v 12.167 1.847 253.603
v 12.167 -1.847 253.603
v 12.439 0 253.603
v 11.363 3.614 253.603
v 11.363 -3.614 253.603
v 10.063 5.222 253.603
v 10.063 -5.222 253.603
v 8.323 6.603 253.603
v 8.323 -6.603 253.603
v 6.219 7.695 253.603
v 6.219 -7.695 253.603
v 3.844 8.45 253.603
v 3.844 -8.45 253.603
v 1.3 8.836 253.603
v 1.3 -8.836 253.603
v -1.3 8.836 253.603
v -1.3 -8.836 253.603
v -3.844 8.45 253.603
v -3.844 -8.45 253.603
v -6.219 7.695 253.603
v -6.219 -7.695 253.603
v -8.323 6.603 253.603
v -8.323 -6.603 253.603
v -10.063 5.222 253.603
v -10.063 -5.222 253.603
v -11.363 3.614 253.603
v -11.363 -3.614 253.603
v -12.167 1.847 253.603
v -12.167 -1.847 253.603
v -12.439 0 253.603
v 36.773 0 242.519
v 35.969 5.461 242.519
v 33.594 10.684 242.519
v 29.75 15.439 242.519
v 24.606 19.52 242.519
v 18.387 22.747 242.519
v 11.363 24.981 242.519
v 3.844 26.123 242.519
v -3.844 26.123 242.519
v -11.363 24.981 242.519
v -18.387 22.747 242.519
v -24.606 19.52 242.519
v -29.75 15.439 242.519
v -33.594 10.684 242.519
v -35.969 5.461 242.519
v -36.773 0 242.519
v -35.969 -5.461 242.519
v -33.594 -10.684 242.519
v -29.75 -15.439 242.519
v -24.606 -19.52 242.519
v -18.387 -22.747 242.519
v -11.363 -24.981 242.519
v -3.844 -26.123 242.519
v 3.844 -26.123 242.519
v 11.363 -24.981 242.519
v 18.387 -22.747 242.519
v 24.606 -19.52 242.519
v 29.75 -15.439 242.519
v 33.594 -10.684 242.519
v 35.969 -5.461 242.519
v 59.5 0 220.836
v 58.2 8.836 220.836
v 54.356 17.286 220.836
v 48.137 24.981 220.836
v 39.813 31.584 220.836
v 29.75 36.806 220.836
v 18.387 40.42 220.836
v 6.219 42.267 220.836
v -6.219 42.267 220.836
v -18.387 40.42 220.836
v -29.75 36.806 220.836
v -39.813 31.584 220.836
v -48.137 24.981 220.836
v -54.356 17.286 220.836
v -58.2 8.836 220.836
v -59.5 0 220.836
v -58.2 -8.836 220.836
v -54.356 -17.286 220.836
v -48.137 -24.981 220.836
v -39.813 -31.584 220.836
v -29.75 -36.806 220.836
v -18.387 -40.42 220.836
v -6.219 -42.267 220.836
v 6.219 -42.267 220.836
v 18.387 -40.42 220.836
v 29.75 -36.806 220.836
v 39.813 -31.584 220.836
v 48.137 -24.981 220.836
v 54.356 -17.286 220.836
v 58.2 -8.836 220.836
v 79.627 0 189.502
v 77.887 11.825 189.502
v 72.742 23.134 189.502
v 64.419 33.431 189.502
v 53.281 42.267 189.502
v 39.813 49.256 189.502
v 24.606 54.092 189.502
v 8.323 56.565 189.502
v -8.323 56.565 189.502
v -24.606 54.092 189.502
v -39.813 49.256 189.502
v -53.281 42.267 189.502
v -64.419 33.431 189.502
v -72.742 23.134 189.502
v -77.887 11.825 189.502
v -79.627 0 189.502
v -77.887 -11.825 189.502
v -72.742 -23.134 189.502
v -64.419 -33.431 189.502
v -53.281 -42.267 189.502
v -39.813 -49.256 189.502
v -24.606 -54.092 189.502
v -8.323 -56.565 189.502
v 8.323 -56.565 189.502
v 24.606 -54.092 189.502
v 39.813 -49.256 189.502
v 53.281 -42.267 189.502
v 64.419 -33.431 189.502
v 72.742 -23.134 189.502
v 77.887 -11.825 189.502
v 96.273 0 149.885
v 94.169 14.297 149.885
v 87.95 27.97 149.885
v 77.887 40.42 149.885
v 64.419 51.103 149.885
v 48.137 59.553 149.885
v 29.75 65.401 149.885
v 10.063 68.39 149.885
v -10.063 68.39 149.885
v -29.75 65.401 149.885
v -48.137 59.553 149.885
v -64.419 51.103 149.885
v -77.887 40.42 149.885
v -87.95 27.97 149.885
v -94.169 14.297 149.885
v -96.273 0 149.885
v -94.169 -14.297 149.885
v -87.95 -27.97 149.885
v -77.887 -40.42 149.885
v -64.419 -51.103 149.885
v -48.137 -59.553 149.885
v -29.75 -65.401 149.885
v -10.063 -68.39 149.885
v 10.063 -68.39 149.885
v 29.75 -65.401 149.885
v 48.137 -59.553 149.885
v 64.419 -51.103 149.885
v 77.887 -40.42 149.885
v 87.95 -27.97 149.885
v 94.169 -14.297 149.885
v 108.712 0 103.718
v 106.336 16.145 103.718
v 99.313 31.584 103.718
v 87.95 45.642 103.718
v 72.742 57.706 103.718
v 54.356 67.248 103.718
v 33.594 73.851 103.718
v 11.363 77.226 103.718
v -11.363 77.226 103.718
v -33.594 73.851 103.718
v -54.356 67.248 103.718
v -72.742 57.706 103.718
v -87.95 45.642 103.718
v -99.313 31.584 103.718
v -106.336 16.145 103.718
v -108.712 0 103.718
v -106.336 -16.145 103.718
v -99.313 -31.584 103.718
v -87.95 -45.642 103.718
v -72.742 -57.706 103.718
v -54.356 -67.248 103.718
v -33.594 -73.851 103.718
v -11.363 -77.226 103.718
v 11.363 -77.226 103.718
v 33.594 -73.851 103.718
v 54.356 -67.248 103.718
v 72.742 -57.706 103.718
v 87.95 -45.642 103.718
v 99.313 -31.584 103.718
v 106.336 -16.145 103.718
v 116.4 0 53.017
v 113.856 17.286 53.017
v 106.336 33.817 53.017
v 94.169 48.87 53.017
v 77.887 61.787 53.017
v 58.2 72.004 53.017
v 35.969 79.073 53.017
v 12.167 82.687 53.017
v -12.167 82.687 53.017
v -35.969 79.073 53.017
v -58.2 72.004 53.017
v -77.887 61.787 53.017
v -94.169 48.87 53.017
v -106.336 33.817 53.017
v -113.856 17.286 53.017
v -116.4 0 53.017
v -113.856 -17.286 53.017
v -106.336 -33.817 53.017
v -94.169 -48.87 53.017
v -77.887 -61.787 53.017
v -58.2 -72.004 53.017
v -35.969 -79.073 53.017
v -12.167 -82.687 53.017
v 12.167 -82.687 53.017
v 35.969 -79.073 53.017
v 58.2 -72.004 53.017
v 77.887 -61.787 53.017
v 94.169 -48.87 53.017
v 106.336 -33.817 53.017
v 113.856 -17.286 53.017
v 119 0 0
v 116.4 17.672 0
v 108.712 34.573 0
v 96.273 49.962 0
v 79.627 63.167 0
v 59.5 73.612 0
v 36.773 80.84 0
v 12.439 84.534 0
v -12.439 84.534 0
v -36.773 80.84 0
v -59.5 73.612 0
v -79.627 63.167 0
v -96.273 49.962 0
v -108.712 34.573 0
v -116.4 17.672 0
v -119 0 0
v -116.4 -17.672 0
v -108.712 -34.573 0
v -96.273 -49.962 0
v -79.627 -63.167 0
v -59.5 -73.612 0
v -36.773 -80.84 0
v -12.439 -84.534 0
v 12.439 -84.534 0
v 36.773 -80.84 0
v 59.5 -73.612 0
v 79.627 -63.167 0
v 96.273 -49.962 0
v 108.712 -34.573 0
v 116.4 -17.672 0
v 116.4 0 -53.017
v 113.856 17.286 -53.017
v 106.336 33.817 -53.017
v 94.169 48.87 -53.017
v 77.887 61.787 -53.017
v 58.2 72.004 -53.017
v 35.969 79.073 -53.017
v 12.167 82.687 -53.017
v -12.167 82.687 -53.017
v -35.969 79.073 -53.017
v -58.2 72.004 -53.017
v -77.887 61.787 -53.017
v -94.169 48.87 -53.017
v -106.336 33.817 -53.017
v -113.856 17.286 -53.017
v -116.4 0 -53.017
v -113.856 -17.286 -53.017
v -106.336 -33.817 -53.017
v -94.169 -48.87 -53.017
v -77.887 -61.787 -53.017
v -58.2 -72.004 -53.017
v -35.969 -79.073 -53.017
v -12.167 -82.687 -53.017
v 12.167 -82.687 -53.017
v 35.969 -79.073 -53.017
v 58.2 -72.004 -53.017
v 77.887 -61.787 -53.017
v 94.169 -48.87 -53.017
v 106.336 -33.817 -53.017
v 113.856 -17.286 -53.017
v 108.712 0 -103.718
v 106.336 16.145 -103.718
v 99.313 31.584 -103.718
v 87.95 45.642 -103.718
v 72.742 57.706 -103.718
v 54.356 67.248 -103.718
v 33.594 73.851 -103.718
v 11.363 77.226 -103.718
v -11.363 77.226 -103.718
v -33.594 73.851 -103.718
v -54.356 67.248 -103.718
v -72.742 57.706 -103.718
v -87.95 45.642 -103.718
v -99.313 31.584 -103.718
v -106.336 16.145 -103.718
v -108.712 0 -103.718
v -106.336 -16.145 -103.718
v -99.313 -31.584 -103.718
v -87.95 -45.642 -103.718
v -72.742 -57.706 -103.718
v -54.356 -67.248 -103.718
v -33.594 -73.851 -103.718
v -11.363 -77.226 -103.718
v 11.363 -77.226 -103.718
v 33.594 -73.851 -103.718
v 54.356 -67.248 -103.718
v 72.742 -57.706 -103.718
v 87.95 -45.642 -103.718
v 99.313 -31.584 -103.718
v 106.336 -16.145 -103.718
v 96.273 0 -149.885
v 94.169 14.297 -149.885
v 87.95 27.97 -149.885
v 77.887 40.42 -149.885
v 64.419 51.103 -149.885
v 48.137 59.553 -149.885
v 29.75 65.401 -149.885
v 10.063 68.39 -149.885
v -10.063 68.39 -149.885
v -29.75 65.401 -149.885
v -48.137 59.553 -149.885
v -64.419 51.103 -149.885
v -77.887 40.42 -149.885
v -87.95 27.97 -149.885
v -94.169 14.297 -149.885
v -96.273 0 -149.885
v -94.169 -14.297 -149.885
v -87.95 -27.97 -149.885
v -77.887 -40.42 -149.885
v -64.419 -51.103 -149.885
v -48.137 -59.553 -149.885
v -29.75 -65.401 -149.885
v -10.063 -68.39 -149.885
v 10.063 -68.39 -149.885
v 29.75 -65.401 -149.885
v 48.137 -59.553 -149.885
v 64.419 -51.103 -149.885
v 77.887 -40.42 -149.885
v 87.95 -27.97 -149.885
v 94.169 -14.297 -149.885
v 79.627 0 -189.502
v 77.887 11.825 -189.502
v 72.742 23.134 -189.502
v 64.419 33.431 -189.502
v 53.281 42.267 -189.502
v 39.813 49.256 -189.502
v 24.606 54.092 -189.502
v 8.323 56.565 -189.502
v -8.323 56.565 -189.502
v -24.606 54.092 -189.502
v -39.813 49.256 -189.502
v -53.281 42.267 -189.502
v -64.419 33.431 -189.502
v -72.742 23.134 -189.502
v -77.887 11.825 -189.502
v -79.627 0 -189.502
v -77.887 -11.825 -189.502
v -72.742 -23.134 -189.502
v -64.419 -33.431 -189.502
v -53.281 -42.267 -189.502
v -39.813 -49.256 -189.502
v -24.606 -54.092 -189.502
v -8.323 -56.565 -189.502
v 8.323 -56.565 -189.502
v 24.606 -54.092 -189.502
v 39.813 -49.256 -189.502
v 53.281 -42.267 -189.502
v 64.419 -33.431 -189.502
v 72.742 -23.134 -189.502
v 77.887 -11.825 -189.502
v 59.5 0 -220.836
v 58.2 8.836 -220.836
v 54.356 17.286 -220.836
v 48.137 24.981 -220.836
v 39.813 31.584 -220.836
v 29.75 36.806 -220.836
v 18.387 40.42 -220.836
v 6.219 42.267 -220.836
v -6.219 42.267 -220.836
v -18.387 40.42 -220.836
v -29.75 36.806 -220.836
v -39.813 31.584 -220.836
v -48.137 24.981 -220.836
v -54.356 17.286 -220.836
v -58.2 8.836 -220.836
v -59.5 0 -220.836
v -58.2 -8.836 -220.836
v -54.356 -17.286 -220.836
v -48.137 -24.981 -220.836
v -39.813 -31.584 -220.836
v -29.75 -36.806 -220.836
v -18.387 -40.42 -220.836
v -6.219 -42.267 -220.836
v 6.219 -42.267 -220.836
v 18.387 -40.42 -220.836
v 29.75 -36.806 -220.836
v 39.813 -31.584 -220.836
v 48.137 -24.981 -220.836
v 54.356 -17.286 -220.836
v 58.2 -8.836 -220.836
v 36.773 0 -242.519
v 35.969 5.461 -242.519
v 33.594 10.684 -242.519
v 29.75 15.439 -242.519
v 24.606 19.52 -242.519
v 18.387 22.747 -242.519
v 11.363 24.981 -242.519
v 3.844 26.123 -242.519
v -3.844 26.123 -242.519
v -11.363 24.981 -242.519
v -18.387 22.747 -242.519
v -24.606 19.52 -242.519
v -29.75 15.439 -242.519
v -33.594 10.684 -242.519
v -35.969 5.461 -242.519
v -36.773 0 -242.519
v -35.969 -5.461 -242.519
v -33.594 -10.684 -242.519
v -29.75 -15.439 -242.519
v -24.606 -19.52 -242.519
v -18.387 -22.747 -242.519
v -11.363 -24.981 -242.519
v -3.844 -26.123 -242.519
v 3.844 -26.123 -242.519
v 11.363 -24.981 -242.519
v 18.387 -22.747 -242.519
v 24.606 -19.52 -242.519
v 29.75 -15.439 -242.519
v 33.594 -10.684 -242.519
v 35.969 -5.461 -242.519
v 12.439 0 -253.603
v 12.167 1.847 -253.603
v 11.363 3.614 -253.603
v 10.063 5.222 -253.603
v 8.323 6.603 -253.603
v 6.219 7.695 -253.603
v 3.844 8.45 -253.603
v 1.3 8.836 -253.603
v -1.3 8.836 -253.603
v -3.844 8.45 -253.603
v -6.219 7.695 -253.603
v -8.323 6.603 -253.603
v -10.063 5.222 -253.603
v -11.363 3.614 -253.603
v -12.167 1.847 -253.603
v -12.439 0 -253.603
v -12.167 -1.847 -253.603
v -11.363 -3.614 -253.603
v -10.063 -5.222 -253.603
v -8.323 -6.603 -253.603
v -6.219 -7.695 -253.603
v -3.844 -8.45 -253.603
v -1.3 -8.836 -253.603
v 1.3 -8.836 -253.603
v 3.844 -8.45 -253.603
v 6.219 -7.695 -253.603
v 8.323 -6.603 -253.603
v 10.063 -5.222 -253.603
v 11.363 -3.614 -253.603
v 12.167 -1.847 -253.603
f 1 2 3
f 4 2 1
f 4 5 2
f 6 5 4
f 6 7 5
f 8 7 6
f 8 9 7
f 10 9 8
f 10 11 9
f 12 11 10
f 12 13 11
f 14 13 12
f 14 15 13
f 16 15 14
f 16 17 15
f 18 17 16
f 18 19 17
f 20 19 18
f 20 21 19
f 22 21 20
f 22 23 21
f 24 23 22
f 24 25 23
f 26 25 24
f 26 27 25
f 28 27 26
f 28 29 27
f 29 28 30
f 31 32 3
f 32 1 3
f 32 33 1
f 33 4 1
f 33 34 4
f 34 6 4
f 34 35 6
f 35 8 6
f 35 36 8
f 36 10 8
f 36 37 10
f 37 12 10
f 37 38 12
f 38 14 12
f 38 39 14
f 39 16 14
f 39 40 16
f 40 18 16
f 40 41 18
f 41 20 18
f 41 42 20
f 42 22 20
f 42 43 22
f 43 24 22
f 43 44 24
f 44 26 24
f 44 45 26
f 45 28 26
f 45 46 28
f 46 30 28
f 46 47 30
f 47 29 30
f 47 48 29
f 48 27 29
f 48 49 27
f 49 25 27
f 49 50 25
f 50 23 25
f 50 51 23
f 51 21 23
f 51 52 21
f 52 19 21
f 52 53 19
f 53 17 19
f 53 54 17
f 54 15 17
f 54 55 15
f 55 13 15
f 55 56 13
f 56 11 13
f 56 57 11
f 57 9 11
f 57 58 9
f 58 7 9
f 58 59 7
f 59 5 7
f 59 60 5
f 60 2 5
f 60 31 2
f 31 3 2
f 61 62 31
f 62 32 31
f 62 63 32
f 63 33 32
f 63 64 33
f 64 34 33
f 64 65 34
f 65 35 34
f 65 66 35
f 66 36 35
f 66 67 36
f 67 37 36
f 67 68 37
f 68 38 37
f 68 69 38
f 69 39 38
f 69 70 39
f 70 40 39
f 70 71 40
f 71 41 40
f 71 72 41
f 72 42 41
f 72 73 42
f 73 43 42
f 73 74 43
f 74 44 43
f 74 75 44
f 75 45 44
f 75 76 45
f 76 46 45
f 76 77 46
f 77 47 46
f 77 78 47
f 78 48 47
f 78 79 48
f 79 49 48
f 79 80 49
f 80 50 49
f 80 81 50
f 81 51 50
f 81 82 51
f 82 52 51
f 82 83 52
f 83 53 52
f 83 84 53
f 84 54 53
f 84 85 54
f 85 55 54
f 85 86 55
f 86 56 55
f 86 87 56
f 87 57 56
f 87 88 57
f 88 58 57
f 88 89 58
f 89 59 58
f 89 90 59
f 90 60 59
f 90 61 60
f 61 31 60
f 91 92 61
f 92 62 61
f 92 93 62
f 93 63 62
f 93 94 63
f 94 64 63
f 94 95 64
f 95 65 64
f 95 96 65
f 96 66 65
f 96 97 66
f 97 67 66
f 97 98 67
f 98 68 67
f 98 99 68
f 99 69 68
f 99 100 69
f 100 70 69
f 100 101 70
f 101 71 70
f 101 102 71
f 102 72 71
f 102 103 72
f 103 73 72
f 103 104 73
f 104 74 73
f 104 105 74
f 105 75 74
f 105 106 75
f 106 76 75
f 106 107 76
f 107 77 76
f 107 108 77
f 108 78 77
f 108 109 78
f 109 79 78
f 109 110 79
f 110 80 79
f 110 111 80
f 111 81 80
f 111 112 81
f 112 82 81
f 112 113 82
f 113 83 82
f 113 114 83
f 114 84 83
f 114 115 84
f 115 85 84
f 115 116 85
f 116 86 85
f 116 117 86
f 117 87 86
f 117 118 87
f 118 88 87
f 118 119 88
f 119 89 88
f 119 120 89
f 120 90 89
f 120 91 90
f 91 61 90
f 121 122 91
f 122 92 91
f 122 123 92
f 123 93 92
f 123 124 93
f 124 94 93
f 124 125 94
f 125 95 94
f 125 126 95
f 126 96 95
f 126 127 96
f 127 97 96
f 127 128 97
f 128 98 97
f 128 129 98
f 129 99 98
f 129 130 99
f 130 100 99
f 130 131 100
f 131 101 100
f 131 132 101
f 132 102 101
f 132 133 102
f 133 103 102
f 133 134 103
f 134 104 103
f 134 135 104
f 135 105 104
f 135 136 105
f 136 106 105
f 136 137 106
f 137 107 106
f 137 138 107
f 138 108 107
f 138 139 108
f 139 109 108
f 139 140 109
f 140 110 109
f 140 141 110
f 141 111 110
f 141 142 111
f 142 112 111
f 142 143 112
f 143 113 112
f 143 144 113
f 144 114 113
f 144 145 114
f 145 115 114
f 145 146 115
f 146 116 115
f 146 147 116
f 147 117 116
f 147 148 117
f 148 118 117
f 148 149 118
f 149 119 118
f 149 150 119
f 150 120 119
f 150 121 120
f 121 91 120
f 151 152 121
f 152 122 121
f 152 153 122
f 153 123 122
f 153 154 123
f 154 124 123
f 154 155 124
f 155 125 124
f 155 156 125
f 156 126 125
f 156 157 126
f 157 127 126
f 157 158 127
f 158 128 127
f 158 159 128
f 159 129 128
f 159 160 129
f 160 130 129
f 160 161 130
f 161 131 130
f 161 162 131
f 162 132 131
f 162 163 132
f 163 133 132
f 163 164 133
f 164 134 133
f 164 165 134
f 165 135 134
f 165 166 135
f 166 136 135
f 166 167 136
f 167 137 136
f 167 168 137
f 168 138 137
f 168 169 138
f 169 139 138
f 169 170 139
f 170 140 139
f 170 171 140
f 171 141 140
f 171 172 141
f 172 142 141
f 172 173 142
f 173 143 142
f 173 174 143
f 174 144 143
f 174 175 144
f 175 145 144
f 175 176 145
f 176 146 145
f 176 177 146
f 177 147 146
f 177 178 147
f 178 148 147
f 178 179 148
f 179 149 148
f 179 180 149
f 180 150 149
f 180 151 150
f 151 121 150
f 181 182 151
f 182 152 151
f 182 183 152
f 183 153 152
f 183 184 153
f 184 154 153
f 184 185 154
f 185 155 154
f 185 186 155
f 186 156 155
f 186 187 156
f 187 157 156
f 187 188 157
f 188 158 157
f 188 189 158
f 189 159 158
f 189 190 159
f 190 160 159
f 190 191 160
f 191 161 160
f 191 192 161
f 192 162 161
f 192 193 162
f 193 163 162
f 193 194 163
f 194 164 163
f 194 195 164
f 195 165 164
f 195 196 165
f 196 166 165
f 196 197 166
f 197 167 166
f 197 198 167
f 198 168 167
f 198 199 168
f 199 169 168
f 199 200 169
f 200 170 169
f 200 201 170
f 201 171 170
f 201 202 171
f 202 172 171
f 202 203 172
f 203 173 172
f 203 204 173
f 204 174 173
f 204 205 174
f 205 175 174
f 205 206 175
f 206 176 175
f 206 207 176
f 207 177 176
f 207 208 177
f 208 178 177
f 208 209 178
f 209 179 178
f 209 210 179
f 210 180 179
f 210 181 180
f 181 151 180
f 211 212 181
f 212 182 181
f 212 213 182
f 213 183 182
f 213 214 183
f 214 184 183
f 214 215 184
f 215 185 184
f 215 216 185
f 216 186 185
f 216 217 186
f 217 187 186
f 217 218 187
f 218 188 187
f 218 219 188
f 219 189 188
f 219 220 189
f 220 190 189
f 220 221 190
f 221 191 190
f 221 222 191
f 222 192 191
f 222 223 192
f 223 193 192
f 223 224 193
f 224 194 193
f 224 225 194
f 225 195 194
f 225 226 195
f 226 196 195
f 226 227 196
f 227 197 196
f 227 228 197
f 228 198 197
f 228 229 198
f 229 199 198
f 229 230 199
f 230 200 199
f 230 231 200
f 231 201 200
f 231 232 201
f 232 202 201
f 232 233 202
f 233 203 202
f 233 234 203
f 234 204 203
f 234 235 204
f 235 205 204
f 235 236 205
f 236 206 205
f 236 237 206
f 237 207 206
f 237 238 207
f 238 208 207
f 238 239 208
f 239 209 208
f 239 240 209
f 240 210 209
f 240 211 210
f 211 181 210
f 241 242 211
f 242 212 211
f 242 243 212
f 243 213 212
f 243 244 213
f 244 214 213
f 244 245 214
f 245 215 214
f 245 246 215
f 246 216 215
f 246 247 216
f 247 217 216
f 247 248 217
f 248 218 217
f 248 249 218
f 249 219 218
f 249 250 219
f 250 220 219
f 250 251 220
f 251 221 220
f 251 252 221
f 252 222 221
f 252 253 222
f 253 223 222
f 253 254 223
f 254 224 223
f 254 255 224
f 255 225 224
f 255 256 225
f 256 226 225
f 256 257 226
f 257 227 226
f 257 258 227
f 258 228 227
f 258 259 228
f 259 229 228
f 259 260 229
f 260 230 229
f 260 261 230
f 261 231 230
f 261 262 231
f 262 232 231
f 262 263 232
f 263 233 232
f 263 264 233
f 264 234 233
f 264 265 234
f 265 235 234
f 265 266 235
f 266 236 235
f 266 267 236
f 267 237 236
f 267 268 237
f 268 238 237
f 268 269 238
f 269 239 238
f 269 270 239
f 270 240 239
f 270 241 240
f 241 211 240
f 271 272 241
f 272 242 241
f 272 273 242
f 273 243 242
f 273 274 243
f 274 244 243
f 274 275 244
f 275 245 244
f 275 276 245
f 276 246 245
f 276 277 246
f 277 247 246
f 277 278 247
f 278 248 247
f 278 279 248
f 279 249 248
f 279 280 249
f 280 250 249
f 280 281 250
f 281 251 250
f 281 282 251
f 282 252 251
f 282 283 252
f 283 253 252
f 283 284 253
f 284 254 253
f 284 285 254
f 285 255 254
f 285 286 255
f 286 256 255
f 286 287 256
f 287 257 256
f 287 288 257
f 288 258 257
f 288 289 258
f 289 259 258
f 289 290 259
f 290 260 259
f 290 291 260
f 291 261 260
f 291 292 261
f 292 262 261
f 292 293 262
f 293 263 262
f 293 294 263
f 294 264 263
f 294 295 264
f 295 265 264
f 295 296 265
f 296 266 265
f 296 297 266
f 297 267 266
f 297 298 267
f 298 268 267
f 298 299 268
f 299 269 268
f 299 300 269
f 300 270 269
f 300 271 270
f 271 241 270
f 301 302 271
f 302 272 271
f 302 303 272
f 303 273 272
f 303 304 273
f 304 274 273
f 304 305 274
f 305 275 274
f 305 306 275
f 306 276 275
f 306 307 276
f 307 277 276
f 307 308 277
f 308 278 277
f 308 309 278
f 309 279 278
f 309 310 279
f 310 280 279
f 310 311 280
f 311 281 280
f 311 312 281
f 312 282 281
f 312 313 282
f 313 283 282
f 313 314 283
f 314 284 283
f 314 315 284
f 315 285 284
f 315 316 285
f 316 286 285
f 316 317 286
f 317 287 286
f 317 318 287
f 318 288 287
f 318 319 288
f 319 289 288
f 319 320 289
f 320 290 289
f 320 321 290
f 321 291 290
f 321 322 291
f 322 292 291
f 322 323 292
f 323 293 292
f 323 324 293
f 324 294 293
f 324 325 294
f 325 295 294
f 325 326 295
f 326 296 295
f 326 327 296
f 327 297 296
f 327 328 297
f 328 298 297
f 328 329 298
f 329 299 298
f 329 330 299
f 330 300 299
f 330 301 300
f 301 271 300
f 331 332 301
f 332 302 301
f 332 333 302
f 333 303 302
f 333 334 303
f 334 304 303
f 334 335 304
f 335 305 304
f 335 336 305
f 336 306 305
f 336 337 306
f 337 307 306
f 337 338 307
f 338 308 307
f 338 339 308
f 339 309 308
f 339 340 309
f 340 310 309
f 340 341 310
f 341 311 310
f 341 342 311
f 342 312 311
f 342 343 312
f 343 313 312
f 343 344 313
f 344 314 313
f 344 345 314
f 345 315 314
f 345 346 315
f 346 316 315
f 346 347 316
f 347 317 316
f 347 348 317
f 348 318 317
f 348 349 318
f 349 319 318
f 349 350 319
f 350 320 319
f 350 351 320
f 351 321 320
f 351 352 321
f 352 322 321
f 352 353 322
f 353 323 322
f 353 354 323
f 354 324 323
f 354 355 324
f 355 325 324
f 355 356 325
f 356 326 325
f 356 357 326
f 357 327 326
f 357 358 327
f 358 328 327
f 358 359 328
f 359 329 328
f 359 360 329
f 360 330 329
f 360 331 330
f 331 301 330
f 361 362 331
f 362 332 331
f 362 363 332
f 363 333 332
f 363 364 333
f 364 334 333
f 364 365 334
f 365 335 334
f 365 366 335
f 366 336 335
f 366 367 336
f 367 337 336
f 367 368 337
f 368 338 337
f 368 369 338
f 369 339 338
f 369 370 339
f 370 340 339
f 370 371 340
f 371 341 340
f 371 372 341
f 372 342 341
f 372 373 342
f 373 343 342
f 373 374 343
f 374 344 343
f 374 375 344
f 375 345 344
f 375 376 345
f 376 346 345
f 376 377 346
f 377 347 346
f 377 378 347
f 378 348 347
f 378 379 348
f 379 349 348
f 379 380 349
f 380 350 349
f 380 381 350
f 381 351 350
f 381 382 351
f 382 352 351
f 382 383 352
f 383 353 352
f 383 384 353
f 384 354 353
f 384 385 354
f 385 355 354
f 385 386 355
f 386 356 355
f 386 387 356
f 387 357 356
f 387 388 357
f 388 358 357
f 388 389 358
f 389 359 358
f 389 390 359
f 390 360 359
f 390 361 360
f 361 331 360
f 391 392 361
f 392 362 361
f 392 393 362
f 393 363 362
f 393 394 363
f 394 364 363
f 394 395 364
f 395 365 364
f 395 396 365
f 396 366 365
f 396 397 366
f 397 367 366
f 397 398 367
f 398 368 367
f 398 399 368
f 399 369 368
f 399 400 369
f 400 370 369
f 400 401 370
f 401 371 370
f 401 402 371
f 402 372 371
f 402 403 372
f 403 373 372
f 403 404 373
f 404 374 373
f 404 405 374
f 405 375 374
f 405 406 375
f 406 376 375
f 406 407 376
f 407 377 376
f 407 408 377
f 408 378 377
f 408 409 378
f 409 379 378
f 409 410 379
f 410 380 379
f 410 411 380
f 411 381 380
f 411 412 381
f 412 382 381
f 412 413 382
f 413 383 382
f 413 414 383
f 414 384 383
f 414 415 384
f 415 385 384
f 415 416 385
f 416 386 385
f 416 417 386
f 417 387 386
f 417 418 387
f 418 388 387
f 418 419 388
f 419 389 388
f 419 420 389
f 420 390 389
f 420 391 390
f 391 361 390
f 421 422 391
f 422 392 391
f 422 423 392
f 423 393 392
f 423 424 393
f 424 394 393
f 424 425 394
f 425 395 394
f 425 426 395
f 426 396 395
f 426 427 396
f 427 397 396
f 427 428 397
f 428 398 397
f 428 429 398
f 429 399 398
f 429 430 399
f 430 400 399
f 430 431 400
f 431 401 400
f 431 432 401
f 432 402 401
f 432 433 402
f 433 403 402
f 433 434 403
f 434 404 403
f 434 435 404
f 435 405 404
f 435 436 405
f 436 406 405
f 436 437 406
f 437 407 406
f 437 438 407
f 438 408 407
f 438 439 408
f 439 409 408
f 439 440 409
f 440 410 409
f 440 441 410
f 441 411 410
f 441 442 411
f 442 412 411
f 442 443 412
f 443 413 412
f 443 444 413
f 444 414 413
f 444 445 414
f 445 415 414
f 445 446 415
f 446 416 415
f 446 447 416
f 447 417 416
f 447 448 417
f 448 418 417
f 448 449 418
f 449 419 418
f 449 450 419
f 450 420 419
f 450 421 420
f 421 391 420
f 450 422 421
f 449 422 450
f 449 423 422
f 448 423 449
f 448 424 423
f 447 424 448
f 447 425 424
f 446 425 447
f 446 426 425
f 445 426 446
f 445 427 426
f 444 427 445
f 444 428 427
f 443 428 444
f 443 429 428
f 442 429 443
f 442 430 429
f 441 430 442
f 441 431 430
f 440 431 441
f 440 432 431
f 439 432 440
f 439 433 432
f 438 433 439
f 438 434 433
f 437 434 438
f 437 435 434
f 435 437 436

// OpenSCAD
// Generated by SolidPython 1.0.1 on 2020-07-29 00:46:47


scale(v = [7, 5, 15]) {
	sphere(r = 17);
}
/***********************************************
*********      SolidPython code:      **********
************************************************
 
# import packages: SolidPython
from solid import *
from solid.utils import *
from itertools import chain, combinations, permutations


class Resize:

    def __init__(self, scad_file):
        self.scad_file = scad_file
        #self.scad_file = import_scad(scad_file)
        # cone/cylinder param:
        self.r1 = 0
        self.r2 = 0
        self.h = 0
        # rectangular prism param:
        self.w = 0
        self.l = 0
        # ellipse param:
        self.r = 0

    # import OpenScad code (file name corresponds to shape)


    # classify shape + parameters
    def assign(self, param1, param2, param3):
        if self.scad_file == 'cone.scad':
            self.r1 = param1
            self.r2 = param2
            self.h = param3
        elif self.scad_file == 'cylinder.scad':
            self.r1 = param1
            self.r2 = param2
            self.h = param3
        elif self.scad_file == 'rectangularPrism.scad':
            self.h = param1
            self.l = param2
            self.w = param3
        else:
            self.r = param1
            self.h = param2

    # resize parameters
    def iterate(self):
        x = range(3, 20, 2)
        i = 1
        if self.scad_file == 'cone.scad':
            tempList = list(permutations(x, 2))
            for temp in tempList:
                param1 = temp[0]
                param2 = temp[1]
                filepath = 'produced_scad_files/' + 'cone' + str(param1) + '_' + str(param2) + '_' + '.scad'
                scad_render_to_file(cylinder(h=param1, r1=param2, r2=0), filepath)

        elif self.scad_file == 'cylinder.scad':
            tempList = list(permutations(x, 3))
            for temp in tempList:
                param1 = temp[0]
                param2 = temp[1]
                filepath = 'produced_scad_files/' + 'cylinder' + str(param1) + '_' + str(param2) + '_' + '.scad'
                scad_render_to_file(cylinder(h=param1, r1=param2, r2=param2), filepath)

        elif self.scad_file == 'rectangularPrism.scad':
            tempList = list(permutations(x, 3))
            for temp in tempList:
                param1 = temp[0]
                param2 = temp[1]
                param3 = temp[2]
                filepath = 'produced_scad_files/' + 'rectangularPrism' + str(param1) + '_' + str(param2) + '_' + str(
                    param3) + '.scad'
                scad_render_to_file(cube(size=(param1, param2, param3)), filepath)

        elif self.scad_file == 'ellipse.scad':
            tempList = list(permutations(x, 4))
            for temp in tempList:
                param1 = temp[0]
                param2 = temp[1]
                param3 = temp[2]
                param4 = temp[3]
                filepath = 'produced_scad_files/' + 'ellipse' + str(param1) + '_' + str(param2) + '_' + str(param3) + '_' + str(param4) + '.scad'
                scad_render_to_file(scale([param1, param2, param3])(sphere(r=param4)), filepath)

    def render_to_scadfile(self):
        scad_render_to_file(scad, 'example.scad') 
 
************************************************/
